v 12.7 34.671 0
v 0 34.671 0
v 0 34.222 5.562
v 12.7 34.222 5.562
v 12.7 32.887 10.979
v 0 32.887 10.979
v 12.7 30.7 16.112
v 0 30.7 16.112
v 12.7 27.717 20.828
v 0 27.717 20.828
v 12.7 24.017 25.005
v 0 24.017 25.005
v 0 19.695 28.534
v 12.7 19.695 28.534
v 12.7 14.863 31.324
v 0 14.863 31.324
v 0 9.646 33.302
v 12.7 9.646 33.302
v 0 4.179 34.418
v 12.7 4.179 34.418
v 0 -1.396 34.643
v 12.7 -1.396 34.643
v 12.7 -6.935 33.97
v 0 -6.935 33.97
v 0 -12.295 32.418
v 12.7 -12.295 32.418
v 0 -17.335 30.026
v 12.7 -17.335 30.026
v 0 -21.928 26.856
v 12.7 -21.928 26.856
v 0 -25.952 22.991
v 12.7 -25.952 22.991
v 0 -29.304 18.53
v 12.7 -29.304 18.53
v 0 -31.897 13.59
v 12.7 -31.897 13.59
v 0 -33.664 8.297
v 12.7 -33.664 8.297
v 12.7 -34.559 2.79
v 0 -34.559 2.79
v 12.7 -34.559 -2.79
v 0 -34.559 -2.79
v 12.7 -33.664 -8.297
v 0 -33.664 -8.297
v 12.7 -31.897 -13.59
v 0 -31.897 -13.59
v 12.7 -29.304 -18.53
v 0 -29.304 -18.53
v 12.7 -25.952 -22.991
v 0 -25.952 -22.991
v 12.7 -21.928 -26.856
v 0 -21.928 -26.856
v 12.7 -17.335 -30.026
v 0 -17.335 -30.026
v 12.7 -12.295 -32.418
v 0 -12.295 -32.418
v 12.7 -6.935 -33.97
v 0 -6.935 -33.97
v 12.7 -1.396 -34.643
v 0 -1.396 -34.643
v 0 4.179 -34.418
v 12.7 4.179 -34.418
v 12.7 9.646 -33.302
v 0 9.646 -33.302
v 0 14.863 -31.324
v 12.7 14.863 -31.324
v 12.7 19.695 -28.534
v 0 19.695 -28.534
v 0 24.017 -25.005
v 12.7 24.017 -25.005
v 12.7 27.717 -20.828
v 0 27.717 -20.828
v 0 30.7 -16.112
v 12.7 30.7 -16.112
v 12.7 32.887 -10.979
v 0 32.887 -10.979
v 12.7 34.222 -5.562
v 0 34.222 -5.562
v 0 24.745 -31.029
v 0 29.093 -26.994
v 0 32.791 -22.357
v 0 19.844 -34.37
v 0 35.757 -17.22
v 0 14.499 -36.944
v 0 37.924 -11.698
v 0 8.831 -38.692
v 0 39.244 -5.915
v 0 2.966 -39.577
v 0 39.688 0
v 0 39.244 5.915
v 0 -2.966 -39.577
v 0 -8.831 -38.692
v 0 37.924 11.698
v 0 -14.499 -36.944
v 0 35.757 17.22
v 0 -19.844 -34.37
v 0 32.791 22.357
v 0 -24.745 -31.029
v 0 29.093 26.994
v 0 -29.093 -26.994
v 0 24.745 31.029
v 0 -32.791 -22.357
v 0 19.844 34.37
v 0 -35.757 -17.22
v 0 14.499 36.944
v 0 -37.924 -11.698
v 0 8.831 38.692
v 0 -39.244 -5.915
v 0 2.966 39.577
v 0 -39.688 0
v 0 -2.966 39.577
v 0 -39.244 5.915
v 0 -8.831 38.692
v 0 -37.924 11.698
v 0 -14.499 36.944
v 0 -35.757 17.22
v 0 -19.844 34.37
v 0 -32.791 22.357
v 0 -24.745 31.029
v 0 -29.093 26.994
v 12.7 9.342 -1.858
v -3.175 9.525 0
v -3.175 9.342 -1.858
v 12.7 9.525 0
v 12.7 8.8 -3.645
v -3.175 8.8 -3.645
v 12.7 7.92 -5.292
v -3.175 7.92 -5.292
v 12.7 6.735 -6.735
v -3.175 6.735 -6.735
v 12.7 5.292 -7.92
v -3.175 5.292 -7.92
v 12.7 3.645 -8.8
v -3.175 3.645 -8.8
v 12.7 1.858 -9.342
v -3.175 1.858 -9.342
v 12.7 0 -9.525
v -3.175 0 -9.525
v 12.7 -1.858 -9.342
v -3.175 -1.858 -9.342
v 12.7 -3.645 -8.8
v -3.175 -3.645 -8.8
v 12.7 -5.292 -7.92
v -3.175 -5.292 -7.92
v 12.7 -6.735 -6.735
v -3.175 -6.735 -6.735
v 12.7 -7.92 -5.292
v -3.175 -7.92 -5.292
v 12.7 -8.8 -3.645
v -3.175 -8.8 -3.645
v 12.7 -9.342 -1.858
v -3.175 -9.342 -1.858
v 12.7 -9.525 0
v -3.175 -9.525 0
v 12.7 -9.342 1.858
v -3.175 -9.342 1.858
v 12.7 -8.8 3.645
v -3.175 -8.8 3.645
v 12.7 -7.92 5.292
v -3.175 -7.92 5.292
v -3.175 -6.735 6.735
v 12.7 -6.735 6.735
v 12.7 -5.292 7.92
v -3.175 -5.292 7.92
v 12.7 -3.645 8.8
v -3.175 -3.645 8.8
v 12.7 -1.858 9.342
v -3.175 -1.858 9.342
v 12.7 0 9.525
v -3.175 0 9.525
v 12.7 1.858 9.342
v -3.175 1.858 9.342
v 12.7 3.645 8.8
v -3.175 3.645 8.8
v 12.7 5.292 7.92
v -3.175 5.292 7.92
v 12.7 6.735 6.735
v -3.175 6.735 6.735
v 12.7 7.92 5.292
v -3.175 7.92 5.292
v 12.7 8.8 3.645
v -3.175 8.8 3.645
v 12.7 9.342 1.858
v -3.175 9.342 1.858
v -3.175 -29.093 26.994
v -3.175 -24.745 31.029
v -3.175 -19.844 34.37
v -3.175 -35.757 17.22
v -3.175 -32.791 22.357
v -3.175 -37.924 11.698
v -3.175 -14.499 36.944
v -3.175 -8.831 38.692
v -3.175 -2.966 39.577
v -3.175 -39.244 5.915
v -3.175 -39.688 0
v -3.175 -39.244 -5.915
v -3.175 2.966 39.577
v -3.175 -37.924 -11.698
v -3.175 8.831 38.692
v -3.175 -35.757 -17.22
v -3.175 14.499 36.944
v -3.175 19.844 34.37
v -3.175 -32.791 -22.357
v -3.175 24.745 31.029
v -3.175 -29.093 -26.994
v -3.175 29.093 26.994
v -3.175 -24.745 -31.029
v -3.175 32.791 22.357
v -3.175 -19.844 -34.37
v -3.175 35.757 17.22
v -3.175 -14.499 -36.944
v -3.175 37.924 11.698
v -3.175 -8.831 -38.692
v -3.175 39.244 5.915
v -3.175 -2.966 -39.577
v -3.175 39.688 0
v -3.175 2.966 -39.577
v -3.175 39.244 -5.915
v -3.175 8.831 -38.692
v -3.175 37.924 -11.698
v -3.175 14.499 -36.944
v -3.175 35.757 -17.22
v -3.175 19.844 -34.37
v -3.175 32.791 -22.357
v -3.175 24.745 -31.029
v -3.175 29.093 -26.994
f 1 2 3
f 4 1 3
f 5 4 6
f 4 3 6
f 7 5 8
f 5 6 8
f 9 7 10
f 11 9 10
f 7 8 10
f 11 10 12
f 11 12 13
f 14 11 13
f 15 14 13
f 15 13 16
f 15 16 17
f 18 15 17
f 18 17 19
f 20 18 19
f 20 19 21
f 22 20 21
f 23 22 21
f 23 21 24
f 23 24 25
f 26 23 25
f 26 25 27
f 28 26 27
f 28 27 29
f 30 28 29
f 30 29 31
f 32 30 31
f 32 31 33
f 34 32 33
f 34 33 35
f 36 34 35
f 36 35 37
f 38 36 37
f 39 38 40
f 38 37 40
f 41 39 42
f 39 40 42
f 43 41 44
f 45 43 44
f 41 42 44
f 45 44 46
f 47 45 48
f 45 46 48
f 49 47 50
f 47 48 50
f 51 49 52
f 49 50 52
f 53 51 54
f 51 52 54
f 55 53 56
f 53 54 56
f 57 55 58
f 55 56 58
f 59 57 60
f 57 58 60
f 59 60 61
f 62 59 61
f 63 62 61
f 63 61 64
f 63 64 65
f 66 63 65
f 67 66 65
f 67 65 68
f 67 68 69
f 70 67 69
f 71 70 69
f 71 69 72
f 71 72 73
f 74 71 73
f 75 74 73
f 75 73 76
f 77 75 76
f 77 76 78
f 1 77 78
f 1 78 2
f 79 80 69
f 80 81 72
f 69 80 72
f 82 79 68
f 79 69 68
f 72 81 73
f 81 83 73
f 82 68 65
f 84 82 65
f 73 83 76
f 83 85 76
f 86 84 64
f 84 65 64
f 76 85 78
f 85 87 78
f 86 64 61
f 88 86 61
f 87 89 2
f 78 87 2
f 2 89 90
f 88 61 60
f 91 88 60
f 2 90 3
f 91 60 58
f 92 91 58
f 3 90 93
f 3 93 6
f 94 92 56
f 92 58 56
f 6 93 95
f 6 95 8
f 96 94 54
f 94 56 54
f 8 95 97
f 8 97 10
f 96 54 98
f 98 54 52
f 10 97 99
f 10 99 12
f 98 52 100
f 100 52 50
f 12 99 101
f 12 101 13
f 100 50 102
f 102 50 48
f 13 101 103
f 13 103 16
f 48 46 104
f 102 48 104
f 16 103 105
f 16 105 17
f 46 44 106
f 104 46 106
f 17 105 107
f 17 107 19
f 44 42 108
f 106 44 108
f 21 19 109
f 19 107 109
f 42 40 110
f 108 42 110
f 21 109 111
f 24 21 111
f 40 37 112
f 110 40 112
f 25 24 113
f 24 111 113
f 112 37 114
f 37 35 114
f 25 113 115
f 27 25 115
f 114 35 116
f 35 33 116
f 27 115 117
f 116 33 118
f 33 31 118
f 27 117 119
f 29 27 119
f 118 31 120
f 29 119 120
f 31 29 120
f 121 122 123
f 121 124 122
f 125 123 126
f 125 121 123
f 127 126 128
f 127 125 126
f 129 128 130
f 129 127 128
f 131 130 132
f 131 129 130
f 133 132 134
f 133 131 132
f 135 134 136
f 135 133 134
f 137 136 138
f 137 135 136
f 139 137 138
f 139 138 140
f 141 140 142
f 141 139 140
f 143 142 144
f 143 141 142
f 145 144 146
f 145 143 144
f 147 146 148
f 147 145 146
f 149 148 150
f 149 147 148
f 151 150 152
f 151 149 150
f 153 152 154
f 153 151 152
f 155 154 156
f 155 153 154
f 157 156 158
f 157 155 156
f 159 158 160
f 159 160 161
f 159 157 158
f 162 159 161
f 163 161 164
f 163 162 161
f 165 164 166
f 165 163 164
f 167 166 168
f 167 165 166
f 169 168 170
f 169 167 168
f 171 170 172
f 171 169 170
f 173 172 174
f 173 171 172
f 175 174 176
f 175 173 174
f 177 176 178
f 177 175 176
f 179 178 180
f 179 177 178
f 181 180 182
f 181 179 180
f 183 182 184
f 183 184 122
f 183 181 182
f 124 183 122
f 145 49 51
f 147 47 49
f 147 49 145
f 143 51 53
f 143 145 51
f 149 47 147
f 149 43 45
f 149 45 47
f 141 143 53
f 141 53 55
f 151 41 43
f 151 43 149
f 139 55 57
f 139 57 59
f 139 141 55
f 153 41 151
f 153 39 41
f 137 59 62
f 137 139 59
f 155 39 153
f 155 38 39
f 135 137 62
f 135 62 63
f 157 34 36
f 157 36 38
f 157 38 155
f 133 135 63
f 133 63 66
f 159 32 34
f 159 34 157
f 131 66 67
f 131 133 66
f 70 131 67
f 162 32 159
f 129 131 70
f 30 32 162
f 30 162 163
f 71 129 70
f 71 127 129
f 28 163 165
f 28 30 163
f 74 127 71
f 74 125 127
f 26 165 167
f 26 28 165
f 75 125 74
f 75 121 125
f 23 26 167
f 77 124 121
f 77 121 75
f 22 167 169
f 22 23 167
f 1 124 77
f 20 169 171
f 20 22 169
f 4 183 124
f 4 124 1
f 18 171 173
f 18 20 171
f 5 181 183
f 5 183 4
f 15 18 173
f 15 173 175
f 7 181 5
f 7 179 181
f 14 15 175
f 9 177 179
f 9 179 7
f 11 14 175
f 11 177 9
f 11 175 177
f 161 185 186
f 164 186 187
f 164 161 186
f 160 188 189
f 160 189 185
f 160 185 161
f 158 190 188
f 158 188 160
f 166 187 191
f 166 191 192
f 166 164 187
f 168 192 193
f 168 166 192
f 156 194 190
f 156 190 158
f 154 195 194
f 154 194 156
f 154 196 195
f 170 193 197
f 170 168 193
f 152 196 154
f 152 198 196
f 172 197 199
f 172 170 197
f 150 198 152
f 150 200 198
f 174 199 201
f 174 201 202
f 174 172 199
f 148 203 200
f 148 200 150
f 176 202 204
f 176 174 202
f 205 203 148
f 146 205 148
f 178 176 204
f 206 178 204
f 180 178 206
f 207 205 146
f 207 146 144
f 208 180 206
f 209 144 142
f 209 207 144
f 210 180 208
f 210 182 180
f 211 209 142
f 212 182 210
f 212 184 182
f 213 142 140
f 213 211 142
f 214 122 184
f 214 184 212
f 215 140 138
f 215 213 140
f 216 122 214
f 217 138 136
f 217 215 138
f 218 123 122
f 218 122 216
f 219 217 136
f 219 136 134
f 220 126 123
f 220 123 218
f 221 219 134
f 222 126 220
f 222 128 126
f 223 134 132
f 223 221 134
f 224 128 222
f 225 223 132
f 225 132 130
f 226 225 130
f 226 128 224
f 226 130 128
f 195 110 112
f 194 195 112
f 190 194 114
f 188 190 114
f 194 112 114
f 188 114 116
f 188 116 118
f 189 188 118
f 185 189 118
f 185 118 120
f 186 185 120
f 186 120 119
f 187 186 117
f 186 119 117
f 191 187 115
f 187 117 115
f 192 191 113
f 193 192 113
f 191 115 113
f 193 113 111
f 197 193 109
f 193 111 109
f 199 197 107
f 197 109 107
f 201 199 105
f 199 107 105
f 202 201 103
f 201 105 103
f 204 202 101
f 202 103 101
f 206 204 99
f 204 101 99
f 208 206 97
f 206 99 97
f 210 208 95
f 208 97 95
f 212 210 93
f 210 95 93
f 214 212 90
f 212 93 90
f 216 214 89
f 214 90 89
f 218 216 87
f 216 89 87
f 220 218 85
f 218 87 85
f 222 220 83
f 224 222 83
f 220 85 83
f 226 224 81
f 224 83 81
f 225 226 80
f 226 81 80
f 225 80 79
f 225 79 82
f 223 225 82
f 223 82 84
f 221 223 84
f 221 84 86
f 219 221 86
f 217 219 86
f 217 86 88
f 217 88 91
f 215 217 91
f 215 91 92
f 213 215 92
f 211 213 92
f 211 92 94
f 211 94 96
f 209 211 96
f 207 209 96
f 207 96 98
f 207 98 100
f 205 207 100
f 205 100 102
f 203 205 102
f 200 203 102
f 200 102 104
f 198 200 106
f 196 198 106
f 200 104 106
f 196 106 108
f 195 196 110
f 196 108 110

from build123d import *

# Parameters (mm, degrees)
F0_R      = 34.671
F0_R_2    = 9.525
F1_DEPTH  = 12.7
F2_R      = 39.6875
F2_R_2    = 34.671
F3_DEPTH  = 3.175
F1_FACE_R = 9.525
F4_DEPTH  = 3.175


with BuildPart() as f1:
    # F0 (on Right) → F1 (new body)
    with BuildSketch(Plane.YZ):
        Circle(F0_R)
        Circle(F0_R_2, mode=Mode.SUBTRACT)
    extrude(amount=F1_DEPTH)

    # F2 (on face) → F3 (join)
    with BuildSketch(Plane(origin=(0, 0, 0), x_dir=(0, -1, 0), z_dir=(-1, 0, 0))):
        Circle(F2_R)
        Circle(F2_R_2, mode=Mode.SUBTRACT)
    extrude(amount=F3_DEPTH)

    # F1_face (on face) → F4 (join)
    with BuildSketch(Plane(origin=(0, 0, 0), x_dir=(0, 1, 0), z_dir=(-1, 0, 0))):
        with BuildLine():
            ThreePointArc((-34.671, 0), (0, -34.671), (34.671, 0))
            ThreePointArc((34.671, 0), (0, 34.671), (-34.671, 0))
        make_face()
        Circle(F1_FACE_R, mode=Mode.SUBTRACT)
    extrude(amount=F4_DEPTH)


solid = f1.part
